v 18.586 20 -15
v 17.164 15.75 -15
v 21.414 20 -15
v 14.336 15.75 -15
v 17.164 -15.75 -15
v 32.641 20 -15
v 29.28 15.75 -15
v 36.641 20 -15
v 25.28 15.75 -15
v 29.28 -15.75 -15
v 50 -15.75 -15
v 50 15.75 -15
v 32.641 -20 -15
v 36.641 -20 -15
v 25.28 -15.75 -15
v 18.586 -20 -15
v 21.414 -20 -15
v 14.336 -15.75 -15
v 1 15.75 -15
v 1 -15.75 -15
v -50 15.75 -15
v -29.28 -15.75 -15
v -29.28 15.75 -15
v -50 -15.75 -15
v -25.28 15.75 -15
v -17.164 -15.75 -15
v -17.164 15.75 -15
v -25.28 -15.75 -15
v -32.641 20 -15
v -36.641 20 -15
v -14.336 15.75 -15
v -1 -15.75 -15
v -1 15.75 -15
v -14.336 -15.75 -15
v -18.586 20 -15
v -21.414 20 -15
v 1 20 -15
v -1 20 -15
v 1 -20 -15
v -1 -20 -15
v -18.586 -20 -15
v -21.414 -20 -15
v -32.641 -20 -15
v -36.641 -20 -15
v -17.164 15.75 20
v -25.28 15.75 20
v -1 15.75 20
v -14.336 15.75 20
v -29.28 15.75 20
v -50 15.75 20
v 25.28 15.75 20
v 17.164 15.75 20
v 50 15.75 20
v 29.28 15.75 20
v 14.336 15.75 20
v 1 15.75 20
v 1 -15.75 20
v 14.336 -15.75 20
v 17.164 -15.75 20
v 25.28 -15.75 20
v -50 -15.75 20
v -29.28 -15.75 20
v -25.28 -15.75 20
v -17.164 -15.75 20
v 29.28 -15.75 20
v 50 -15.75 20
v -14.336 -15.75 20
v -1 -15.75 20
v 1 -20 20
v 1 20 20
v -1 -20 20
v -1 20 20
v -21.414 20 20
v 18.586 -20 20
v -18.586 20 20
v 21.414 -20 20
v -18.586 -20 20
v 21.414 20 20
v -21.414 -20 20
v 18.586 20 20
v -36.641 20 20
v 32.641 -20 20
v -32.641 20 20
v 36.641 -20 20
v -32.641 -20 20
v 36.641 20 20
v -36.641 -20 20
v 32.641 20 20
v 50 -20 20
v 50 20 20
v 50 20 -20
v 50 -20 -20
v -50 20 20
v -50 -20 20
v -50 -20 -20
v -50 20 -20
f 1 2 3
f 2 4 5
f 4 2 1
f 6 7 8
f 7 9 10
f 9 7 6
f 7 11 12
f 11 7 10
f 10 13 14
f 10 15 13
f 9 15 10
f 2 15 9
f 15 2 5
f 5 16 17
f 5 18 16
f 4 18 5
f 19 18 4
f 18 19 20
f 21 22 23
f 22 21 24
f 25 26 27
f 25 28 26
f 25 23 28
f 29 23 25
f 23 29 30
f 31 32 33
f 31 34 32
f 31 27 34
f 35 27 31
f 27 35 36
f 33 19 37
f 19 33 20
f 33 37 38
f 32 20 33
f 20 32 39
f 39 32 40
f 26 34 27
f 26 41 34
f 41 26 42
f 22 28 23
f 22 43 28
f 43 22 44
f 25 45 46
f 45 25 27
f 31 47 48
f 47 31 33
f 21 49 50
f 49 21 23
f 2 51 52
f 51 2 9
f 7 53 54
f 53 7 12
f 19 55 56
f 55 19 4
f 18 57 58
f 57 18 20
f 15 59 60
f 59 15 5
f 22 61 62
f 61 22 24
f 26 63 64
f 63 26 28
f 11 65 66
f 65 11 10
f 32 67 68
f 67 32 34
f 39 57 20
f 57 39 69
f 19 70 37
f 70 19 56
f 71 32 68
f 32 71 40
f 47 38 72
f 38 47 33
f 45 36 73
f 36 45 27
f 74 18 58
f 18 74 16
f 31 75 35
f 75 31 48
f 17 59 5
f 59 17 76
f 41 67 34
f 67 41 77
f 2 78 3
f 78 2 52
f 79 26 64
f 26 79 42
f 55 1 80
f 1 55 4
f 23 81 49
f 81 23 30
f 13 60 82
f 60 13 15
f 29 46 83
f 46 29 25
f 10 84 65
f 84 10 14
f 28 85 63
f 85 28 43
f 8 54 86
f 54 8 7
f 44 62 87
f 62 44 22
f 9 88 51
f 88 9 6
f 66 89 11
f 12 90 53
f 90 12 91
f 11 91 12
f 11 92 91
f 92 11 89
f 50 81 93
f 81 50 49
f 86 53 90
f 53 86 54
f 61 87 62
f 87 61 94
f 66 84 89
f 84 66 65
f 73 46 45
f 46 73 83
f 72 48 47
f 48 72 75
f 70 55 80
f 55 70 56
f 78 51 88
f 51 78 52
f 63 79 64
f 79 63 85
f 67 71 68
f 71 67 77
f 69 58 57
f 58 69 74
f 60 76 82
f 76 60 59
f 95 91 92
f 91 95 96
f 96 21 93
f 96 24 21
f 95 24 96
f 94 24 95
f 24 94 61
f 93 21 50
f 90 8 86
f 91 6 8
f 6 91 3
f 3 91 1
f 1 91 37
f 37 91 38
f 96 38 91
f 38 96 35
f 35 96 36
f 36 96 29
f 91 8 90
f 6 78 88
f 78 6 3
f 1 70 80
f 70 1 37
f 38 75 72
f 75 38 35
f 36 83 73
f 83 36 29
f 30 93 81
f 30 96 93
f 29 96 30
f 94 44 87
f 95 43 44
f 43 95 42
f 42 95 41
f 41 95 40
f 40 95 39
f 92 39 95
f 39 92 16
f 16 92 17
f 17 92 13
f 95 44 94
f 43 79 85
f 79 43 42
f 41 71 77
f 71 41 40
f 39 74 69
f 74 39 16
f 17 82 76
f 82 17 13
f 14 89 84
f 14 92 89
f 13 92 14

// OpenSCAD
x=100;
y=30;
z=30;
cut=2;
module miter(){
difference(){
cube([x,y+10,z+10],true);
union(){
translate([0,0,5])cube([x+12,y+1.5,z+10],true);
translate([0,0,5])cube([cut,y*2,z+10],true); //90
rotate([0,0,45])translate([0,0,5])cube([cut,y*3,z+10],true); //45
rotate([0,0,-45])translate([0,0,5])cube([cut,y*3,z+10],true); //-45
rotate([0,0,60])translate([0,0,5])cube([cut,y*3,z+10],true); //60
rotate([0,0,-60])translate([0,0,5])cube([cut,y*3,z+10],true); //-60
}
}
}


miter();
